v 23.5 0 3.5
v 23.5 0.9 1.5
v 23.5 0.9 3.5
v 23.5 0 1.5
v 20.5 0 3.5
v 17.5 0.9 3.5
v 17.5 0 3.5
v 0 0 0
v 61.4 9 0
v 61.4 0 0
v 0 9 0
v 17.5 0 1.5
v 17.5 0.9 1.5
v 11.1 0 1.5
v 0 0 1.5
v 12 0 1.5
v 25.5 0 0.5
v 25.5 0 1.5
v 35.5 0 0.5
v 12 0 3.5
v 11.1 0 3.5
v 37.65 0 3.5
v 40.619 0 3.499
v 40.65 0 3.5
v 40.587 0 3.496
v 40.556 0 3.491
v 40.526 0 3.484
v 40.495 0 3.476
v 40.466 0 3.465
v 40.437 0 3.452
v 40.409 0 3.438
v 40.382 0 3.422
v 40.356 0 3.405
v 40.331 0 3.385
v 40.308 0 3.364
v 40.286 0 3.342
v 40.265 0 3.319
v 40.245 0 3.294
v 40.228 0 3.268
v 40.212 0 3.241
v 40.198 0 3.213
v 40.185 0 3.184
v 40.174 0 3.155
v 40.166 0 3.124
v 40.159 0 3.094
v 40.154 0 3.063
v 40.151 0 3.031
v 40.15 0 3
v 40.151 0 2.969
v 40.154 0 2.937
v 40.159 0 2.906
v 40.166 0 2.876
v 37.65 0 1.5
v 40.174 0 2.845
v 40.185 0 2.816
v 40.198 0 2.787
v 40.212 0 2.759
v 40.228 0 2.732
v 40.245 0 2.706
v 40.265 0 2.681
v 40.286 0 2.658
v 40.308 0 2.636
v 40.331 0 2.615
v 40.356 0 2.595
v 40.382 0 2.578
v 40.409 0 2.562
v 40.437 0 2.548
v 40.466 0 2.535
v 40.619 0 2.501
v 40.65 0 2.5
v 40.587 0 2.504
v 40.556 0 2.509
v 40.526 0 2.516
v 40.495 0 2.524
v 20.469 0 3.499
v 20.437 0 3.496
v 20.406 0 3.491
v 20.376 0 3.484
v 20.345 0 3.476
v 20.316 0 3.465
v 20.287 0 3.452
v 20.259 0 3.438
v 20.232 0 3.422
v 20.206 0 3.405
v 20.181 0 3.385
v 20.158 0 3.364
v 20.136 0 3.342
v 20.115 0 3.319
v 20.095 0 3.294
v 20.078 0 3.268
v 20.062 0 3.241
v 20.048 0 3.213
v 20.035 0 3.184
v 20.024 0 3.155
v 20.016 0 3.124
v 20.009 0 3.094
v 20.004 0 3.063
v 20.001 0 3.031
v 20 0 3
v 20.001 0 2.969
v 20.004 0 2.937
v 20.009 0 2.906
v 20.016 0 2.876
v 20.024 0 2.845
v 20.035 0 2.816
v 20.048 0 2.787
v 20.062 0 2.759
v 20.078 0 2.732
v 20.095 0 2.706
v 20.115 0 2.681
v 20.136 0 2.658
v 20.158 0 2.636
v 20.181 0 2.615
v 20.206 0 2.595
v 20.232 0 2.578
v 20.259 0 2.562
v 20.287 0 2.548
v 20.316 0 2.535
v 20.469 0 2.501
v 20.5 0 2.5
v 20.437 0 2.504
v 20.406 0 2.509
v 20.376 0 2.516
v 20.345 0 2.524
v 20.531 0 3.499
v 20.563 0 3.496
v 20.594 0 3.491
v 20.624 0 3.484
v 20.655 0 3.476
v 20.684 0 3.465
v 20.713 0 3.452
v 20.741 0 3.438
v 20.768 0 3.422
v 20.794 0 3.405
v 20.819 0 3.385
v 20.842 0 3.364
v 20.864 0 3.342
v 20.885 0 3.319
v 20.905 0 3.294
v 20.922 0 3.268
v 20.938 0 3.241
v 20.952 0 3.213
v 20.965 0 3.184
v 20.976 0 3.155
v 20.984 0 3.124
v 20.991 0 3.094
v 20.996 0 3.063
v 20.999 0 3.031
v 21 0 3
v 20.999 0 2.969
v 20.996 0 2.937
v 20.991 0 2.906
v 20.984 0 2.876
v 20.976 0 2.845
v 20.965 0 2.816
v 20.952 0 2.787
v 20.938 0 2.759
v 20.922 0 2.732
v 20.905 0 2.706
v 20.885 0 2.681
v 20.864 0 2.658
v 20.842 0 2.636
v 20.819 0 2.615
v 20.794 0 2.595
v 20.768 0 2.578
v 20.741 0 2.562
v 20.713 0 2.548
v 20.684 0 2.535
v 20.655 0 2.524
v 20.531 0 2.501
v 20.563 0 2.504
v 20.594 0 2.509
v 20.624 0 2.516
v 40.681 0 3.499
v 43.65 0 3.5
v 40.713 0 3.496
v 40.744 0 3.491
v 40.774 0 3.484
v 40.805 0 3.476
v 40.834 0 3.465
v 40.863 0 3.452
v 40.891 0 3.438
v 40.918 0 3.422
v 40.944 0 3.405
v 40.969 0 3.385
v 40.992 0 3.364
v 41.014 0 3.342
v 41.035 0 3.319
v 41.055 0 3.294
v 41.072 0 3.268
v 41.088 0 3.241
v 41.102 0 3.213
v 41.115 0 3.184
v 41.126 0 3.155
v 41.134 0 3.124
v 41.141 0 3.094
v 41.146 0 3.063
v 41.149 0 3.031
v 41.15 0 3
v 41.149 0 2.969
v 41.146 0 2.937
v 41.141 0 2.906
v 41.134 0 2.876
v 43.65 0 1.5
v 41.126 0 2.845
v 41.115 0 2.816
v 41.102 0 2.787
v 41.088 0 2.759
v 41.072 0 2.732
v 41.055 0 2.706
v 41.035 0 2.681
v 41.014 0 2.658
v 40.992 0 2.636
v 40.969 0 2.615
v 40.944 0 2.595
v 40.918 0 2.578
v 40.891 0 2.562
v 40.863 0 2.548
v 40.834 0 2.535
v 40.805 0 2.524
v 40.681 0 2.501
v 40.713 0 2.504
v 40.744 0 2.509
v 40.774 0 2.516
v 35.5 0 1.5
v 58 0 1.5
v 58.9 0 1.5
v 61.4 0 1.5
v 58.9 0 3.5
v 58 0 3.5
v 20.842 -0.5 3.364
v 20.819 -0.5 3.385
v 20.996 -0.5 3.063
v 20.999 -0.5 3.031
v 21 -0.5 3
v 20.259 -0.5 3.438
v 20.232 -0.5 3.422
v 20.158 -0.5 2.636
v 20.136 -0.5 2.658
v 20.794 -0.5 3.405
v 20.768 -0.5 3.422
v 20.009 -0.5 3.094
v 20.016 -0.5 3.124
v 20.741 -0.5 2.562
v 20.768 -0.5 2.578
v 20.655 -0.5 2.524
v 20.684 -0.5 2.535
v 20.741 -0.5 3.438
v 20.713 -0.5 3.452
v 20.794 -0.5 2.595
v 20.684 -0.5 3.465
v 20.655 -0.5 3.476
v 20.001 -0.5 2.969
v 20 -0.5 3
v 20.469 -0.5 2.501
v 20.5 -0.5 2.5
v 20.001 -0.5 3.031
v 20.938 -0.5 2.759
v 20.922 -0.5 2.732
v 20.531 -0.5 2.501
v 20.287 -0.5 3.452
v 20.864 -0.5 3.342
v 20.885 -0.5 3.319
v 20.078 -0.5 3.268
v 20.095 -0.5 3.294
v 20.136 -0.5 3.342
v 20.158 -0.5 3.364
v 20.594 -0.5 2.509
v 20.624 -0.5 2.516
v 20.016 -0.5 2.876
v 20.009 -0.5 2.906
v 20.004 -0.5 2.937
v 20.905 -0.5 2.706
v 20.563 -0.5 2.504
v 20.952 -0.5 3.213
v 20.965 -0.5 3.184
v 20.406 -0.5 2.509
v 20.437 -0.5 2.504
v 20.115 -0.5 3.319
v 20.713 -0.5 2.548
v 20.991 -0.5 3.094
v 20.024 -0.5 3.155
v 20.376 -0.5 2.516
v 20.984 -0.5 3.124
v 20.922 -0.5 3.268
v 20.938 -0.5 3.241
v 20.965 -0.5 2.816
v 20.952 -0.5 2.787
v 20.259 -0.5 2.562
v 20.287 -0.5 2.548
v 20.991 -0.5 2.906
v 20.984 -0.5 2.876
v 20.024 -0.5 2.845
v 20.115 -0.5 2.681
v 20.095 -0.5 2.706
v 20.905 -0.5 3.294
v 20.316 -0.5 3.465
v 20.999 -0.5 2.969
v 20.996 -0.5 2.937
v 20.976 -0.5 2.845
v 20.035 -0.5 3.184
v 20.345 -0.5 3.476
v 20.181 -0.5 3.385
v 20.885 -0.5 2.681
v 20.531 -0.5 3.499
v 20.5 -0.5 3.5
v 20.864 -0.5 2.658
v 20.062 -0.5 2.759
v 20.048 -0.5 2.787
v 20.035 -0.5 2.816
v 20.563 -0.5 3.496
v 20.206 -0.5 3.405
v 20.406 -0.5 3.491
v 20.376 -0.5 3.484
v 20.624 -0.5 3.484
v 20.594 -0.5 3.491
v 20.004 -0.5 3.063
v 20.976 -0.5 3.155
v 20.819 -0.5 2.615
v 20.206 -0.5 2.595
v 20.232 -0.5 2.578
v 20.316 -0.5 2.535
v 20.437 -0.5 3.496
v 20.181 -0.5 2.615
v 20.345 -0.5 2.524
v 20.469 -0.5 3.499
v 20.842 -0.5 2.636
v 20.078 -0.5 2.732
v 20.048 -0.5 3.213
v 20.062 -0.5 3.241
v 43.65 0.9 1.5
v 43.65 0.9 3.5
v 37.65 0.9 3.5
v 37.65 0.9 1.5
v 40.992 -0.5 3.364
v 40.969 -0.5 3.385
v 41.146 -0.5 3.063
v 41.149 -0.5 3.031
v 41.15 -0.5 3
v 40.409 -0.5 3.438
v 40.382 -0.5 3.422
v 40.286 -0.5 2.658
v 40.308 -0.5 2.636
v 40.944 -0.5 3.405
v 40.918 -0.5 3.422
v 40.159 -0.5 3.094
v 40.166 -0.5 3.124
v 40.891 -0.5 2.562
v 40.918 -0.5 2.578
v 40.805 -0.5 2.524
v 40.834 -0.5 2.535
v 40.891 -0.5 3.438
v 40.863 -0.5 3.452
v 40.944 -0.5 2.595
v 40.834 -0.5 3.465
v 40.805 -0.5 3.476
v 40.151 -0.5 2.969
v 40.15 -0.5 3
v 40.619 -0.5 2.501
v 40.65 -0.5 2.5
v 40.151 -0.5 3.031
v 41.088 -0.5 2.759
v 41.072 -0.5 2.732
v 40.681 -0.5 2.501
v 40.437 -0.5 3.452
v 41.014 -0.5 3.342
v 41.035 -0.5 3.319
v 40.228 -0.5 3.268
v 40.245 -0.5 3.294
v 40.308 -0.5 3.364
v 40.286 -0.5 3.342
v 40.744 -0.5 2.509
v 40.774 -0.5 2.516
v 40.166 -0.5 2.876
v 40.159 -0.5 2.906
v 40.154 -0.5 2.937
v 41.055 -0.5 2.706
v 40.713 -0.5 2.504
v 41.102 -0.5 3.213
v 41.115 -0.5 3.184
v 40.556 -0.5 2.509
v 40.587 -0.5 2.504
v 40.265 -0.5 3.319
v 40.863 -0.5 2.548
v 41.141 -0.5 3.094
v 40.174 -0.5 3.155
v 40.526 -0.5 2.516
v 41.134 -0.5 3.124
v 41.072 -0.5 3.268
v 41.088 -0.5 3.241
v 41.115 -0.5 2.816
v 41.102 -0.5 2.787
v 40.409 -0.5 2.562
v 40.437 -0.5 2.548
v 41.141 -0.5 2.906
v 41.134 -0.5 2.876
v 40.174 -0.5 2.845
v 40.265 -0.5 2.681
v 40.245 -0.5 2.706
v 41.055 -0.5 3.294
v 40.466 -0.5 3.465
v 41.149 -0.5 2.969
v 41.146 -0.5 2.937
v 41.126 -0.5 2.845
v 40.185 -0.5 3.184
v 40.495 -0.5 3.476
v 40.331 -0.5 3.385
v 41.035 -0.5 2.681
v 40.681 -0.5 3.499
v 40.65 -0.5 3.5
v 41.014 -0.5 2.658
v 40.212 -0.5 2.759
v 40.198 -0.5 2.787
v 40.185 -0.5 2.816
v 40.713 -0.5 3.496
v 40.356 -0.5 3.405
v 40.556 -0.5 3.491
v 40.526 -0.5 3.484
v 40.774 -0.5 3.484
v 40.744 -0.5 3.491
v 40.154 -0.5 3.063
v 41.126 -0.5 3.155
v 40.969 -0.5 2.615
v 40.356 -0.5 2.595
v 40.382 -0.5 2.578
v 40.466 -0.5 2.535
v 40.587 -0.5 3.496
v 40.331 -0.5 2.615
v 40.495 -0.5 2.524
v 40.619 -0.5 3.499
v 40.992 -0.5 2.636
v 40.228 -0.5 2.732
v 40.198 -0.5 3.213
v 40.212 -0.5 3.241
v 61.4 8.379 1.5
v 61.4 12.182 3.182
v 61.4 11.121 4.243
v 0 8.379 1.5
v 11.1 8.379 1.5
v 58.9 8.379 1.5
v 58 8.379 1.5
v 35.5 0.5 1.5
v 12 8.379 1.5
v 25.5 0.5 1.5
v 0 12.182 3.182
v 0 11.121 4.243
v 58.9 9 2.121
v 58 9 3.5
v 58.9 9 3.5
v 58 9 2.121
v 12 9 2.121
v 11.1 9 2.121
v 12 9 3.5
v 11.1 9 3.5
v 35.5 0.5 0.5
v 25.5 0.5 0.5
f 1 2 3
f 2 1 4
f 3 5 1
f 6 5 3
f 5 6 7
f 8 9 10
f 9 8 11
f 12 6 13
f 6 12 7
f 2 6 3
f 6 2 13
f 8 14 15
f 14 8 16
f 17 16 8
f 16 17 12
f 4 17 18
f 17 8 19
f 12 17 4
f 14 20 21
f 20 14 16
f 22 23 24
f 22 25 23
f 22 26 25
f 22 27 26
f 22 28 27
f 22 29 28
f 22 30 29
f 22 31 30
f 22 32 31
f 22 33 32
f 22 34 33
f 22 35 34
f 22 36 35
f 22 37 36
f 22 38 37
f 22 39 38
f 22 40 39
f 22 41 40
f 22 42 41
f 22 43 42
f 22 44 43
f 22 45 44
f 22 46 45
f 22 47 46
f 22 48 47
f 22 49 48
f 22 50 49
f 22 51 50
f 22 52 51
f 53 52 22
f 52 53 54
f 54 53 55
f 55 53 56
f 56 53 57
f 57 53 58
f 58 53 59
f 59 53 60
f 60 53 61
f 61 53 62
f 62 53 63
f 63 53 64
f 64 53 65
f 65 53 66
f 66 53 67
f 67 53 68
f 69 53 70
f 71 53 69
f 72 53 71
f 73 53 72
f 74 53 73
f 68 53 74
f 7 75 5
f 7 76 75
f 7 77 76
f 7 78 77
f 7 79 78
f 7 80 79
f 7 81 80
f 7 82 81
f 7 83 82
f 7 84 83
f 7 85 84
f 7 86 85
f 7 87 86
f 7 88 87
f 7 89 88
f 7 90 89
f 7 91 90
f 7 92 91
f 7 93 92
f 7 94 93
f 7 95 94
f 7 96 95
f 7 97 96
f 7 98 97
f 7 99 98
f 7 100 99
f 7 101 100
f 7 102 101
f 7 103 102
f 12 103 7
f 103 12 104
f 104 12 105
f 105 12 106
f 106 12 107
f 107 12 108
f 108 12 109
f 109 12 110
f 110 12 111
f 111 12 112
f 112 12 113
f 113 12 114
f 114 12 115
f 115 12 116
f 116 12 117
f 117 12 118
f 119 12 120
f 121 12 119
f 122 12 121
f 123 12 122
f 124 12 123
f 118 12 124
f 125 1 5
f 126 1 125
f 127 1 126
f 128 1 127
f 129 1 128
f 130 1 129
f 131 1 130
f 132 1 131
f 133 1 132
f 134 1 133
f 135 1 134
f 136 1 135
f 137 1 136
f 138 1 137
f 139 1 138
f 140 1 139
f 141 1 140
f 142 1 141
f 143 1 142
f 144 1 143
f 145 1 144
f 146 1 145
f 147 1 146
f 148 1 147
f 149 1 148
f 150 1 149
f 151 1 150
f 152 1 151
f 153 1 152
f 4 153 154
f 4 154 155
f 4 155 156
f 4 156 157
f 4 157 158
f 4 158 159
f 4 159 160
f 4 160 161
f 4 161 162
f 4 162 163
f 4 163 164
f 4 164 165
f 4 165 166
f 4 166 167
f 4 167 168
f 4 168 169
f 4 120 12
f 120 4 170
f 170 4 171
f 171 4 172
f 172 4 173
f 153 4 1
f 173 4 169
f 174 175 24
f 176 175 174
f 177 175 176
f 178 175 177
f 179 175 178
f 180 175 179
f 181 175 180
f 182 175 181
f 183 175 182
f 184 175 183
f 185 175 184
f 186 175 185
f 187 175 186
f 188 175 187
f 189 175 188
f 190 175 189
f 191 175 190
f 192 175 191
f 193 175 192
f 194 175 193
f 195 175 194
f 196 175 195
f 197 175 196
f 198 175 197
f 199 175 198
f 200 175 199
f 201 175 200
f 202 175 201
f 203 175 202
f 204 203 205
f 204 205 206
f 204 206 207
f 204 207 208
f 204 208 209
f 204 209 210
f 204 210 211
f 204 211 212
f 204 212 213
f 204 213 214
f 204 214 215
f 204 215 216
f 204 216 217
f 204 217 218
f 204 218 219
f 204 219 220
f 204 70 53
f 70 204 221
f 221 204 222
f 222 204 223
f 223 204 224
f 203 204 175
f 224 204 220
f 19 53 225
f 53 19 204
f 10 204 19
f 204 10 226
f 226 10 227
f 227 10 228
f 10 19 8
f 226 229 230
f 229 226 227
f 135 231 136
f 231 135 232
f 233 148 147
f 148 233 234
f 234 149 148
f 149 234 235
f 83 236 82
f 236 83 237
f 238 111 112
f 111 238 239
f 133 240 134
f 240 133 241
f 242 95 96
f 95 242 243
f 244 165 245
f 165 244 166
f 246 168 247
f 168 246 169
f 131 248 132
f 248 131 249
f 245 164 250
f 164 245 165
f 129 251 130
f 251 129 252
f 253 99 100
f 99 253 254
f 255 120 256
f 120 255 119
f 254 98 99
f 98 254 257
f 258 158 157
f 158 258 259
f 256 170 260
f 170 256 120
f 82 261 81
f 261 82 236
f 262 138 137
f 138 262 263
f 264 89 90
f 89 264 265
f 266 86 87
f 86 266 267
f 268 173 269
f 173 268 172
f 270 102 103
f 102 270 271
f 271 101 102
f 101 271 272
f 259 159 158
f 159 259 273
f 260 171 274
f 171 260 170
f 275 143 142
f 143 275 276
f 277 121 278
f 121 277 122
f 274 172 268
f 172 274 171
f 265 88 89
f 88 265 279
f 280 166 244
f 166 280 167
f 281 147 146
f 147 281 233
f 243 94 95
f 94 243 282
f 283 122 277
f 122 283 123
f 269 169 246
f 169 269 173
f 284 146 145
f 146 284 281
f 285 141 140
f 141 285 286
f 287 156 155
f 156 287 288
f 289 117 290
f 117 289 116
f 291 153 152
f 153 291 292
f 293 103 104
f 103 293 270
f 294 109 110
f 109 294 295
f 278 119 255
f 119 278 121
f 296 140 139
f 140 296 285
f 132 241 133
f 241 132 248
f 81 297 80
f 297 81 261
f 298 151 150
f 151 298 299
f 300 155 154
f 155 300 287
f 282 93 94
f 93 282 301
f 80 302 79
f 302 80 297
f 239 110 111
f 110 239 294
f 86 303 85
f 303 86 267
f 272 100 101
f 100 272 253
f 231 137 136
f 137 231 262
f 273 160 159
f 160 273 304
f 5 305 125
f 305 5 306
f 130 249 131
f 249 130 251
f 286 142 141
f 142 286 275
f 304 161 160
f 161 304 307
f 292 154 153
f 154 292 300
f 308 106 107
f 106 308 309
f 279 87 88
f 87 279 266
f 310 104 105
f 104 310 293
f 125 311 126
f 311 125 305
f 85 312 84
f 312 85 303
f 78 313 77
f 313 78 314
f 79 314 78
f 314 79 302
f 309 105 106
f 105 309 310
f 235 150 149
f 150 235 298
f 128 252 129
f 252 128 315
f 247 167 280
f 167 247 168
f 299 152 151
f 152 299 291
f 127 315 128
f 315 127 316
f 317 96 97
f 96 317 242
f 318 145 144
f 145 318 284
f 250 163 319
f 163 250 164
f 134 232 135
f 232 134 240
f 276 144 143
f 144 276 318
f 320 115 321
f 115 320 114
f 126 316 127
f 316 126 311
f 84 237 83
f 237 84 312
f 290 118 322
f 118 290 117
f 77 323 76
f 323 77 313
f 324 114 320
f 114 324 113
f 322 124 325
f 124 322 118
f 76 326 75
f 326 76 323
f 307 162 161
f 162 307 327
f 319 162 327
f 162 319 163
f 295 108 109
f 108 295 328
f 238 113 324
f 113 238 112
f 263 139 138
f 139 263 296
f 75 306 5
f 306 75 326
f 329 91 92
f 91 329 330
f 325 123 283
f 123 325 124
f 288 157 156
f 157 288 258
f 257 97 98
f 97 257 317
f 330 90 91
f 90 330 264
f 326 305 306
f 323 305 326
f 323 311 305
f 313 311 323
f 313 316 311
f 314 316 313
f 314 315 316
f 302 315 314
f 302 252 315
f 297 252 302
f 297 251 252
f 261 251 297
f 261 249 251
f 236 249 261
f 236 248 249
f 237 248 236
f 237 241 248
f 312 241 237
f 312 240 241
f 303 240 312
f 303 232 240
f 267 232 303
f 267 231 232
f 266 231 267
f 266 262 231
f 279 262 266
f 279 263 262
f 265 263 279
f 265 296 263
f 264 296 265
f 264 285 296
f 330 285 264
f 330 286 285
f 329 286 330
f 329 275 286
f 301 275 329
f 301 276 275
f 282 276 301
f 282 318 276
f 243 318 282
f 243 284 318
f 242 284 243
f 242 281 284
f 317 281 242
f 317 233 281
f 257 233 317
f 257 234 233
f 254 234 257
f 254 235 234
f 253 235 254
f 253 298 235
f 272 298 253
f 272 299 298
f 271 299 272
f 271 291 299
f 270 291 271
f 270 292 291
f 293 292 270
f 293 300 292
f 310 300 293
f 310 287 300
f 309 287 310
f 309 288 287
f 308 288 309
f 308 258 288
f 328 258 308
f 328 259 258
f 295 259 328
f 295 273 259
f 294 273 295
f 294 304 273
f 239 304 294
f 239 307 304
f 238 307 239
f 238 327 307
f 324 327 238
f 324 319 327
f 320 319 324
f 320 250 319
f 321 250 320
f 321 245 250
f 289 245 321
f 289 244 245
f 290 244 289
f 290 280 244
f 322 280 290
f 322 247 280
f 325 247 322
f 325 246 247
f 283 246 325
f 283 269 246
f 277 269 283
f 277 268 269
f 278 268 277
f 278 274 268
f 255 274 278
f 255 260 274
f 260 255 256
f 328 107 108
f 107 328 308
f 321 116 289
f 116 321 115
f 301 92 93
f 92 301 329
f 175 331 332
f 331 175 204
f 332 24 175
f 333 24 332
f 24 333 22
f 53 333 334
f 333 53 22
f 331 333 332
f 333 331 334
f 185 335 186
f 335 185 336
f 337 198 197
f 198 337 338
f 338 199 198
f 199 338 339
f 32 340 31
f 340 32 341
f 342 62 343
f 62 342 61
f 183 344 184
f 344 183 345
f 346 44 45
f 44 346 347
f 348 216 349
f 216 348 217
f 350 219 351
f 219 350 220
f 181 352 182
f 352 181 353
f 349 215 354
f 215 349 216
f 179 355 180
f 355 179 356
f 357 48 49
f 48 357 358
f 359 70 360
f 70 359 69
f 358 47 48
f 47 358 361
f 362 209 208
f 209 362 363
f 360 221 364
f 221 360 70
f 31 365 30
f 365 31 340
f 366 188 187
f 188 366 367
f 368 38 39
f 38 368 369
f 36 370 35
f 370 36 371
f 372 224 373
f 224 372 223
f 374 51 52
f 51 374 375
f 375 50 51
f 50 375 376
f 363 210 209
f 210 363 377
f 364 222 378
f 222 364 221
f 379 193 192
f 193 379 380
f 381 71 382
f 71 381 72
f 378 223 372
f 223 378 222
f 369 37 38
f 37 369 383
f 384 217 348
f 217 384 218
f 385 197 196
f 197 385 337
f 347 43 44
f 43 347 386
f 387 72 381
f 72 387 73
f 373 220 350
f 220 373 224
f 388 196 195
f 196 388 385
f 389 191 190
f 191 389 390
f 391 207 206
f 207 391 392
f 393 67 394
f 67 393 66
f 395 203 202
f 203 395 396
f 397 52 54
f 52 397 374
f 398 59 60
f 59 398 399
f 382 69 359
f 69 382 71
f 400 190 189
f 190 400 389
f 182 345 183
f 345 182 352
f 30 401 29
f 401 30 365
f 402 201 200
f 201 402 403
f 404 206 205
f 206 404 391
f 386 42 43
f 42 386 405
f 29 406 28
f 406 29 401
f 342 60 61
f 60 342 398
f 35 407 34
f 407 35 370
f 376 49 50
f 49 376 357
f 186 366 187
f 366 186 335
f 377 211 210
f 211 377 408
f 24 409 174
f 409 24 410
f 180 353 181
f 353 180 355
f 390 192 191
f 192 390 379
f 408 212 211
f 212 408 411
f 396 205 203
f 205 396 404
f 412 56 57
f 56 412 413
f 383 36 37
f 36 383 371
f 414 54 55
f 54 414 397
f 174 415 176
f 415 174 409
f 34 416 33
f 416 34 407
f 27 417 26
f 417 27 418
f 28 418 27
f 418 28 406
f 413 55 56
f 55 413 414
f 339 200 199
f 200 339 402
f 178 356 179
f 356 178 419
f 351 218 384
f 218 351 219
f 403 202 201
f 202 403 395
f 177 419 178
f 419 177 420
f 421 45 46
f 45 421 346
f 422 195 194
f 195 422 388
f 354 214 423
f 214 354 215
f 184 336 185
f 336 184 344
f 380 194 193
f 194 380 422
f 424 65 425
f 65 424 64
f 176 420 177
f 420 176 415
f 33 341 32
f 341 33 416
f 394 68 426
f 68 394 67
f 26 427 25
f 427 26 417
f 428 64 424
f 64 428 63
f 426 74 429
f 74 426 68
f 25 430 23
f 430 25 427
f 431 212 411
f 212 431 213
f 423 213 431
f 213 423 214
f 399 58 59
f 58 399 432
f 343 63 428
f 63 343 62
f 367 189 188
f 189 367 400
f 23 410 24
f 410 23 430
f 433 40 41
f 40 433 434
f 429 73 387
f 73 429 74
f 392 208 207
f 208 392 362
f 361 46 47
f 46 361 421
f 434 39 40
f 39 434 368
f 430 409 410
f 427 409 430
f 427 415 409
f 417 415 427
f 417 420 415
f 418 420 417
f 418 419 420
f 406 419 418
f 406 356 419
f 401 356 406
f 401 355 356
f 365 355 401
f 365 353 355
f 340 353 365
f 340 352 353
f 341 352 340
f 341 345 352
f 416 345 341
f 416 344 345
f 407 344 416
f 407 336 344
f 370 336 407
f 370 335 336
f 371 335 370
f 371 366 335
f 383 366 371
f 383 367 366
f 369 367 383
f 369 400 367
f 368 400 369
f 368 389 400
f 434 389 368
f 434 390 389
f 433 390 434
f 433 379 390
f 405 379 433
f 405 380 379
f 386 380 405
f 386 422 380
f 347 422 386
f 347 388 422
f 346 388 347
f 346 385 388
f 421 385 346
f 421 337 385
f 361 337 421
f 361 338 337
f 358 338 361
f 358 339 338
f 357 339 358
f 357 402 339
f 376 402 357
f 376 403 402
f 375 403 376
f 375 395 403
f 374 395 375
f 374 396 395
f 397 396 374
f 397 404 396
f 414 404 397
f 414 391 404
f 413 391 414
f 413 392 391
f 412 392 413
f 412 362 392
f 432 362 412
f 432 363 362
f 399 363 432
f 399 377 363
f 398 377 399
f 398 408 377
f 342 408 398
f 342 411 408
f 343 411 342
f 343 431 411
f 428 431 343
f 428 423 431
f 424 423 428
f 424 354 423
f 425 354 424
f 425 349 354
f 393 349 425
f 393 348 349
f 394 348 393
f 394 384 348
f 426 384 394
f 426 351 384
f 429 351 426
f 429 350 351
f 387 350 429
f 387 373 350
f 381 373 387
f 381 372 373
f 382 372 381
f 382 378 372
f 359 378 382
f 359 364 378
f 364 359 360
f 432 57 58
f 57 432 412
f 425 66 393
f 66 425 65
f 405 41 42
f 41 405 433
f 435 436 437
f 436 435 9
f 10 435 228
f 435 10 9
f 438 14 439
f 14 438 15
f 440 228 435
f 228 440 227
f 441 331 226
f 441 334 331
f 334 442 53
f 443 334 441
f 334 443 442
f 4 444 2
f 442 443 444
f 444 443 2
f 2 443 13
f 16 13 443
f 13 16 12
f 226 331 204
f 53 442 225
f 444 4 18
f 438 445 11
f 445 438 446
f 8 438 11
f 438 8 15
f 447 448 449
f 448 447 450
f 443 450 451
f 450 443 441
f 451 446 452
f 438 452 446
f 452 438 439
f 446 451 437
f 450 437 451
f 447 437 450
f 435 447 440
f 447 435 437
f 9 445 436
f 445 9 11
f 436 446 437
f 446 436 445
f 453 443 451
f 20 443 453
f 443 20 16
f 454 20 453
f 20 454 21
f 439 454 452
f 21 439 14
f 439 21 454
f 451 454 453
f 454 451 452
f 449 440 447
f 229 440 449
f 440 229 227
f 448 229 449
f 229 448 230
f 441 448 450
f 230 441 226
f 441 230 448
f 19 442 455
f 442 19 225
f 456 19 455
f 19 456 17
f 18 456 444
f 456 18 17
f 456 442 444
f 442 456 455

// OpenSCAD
width = 61.4;
height = 14.75;
depth = 9;
thickness = 1.5;

$fn = $preview ? 12 : 100;

module door_angle() {
    rotate([90,0,-90])
    linear_extrude(0.45)
    intersection() {
        circle(7);

    polygon([[0,0],[7,0],[7,-7],[2,-4],[3.5,-2.75],[0,-2.75]]);
    
    }
}

module door_nipple() {
    rotate([0,90,0])
        cylinder(d=1.5,h=2.35);
}

module door_angle_holder() {
    cube([0.9,9,3.5]);
}

module clip() {
    cube([6,0.9,3.5]);

    translate([3,0.9,3])
        rotate([90,0,0])
            cylinder(d = 1, h = 1.4);
}

module fingernail() {
    translate([25.5,-1,0.5])
        cube([10,0.5+1,1+1]);
}

module door_solid() {
    cube([width,9,thickness]);

    translate([0,9,0])
        rotate([45,0,0])
            cube([width,4.5,thickness]);

    translate([17.5,0,0])
        clip();

    translate([width-23.75,0,0])
        clip();

    // left
    translate([11.1,0,0])
        door_angle_holder();

    * translate([11.1,height-1.25,depth-1])
        door_angle();

    * translate([11.1-1.4,height-2,depth-3.25])
        door_nipple();

    // right
    translate([width-3.4,0,0])
        door_angle_holder();

    * translate([width-3.4+0.9+0.45,height-1.25,depth-1])
        door_angle();

    * translate([width-3.4,height-2,depth-3.25])
        door_nipple();
}

difference() {
    door_solid();

    fingernail();
}
